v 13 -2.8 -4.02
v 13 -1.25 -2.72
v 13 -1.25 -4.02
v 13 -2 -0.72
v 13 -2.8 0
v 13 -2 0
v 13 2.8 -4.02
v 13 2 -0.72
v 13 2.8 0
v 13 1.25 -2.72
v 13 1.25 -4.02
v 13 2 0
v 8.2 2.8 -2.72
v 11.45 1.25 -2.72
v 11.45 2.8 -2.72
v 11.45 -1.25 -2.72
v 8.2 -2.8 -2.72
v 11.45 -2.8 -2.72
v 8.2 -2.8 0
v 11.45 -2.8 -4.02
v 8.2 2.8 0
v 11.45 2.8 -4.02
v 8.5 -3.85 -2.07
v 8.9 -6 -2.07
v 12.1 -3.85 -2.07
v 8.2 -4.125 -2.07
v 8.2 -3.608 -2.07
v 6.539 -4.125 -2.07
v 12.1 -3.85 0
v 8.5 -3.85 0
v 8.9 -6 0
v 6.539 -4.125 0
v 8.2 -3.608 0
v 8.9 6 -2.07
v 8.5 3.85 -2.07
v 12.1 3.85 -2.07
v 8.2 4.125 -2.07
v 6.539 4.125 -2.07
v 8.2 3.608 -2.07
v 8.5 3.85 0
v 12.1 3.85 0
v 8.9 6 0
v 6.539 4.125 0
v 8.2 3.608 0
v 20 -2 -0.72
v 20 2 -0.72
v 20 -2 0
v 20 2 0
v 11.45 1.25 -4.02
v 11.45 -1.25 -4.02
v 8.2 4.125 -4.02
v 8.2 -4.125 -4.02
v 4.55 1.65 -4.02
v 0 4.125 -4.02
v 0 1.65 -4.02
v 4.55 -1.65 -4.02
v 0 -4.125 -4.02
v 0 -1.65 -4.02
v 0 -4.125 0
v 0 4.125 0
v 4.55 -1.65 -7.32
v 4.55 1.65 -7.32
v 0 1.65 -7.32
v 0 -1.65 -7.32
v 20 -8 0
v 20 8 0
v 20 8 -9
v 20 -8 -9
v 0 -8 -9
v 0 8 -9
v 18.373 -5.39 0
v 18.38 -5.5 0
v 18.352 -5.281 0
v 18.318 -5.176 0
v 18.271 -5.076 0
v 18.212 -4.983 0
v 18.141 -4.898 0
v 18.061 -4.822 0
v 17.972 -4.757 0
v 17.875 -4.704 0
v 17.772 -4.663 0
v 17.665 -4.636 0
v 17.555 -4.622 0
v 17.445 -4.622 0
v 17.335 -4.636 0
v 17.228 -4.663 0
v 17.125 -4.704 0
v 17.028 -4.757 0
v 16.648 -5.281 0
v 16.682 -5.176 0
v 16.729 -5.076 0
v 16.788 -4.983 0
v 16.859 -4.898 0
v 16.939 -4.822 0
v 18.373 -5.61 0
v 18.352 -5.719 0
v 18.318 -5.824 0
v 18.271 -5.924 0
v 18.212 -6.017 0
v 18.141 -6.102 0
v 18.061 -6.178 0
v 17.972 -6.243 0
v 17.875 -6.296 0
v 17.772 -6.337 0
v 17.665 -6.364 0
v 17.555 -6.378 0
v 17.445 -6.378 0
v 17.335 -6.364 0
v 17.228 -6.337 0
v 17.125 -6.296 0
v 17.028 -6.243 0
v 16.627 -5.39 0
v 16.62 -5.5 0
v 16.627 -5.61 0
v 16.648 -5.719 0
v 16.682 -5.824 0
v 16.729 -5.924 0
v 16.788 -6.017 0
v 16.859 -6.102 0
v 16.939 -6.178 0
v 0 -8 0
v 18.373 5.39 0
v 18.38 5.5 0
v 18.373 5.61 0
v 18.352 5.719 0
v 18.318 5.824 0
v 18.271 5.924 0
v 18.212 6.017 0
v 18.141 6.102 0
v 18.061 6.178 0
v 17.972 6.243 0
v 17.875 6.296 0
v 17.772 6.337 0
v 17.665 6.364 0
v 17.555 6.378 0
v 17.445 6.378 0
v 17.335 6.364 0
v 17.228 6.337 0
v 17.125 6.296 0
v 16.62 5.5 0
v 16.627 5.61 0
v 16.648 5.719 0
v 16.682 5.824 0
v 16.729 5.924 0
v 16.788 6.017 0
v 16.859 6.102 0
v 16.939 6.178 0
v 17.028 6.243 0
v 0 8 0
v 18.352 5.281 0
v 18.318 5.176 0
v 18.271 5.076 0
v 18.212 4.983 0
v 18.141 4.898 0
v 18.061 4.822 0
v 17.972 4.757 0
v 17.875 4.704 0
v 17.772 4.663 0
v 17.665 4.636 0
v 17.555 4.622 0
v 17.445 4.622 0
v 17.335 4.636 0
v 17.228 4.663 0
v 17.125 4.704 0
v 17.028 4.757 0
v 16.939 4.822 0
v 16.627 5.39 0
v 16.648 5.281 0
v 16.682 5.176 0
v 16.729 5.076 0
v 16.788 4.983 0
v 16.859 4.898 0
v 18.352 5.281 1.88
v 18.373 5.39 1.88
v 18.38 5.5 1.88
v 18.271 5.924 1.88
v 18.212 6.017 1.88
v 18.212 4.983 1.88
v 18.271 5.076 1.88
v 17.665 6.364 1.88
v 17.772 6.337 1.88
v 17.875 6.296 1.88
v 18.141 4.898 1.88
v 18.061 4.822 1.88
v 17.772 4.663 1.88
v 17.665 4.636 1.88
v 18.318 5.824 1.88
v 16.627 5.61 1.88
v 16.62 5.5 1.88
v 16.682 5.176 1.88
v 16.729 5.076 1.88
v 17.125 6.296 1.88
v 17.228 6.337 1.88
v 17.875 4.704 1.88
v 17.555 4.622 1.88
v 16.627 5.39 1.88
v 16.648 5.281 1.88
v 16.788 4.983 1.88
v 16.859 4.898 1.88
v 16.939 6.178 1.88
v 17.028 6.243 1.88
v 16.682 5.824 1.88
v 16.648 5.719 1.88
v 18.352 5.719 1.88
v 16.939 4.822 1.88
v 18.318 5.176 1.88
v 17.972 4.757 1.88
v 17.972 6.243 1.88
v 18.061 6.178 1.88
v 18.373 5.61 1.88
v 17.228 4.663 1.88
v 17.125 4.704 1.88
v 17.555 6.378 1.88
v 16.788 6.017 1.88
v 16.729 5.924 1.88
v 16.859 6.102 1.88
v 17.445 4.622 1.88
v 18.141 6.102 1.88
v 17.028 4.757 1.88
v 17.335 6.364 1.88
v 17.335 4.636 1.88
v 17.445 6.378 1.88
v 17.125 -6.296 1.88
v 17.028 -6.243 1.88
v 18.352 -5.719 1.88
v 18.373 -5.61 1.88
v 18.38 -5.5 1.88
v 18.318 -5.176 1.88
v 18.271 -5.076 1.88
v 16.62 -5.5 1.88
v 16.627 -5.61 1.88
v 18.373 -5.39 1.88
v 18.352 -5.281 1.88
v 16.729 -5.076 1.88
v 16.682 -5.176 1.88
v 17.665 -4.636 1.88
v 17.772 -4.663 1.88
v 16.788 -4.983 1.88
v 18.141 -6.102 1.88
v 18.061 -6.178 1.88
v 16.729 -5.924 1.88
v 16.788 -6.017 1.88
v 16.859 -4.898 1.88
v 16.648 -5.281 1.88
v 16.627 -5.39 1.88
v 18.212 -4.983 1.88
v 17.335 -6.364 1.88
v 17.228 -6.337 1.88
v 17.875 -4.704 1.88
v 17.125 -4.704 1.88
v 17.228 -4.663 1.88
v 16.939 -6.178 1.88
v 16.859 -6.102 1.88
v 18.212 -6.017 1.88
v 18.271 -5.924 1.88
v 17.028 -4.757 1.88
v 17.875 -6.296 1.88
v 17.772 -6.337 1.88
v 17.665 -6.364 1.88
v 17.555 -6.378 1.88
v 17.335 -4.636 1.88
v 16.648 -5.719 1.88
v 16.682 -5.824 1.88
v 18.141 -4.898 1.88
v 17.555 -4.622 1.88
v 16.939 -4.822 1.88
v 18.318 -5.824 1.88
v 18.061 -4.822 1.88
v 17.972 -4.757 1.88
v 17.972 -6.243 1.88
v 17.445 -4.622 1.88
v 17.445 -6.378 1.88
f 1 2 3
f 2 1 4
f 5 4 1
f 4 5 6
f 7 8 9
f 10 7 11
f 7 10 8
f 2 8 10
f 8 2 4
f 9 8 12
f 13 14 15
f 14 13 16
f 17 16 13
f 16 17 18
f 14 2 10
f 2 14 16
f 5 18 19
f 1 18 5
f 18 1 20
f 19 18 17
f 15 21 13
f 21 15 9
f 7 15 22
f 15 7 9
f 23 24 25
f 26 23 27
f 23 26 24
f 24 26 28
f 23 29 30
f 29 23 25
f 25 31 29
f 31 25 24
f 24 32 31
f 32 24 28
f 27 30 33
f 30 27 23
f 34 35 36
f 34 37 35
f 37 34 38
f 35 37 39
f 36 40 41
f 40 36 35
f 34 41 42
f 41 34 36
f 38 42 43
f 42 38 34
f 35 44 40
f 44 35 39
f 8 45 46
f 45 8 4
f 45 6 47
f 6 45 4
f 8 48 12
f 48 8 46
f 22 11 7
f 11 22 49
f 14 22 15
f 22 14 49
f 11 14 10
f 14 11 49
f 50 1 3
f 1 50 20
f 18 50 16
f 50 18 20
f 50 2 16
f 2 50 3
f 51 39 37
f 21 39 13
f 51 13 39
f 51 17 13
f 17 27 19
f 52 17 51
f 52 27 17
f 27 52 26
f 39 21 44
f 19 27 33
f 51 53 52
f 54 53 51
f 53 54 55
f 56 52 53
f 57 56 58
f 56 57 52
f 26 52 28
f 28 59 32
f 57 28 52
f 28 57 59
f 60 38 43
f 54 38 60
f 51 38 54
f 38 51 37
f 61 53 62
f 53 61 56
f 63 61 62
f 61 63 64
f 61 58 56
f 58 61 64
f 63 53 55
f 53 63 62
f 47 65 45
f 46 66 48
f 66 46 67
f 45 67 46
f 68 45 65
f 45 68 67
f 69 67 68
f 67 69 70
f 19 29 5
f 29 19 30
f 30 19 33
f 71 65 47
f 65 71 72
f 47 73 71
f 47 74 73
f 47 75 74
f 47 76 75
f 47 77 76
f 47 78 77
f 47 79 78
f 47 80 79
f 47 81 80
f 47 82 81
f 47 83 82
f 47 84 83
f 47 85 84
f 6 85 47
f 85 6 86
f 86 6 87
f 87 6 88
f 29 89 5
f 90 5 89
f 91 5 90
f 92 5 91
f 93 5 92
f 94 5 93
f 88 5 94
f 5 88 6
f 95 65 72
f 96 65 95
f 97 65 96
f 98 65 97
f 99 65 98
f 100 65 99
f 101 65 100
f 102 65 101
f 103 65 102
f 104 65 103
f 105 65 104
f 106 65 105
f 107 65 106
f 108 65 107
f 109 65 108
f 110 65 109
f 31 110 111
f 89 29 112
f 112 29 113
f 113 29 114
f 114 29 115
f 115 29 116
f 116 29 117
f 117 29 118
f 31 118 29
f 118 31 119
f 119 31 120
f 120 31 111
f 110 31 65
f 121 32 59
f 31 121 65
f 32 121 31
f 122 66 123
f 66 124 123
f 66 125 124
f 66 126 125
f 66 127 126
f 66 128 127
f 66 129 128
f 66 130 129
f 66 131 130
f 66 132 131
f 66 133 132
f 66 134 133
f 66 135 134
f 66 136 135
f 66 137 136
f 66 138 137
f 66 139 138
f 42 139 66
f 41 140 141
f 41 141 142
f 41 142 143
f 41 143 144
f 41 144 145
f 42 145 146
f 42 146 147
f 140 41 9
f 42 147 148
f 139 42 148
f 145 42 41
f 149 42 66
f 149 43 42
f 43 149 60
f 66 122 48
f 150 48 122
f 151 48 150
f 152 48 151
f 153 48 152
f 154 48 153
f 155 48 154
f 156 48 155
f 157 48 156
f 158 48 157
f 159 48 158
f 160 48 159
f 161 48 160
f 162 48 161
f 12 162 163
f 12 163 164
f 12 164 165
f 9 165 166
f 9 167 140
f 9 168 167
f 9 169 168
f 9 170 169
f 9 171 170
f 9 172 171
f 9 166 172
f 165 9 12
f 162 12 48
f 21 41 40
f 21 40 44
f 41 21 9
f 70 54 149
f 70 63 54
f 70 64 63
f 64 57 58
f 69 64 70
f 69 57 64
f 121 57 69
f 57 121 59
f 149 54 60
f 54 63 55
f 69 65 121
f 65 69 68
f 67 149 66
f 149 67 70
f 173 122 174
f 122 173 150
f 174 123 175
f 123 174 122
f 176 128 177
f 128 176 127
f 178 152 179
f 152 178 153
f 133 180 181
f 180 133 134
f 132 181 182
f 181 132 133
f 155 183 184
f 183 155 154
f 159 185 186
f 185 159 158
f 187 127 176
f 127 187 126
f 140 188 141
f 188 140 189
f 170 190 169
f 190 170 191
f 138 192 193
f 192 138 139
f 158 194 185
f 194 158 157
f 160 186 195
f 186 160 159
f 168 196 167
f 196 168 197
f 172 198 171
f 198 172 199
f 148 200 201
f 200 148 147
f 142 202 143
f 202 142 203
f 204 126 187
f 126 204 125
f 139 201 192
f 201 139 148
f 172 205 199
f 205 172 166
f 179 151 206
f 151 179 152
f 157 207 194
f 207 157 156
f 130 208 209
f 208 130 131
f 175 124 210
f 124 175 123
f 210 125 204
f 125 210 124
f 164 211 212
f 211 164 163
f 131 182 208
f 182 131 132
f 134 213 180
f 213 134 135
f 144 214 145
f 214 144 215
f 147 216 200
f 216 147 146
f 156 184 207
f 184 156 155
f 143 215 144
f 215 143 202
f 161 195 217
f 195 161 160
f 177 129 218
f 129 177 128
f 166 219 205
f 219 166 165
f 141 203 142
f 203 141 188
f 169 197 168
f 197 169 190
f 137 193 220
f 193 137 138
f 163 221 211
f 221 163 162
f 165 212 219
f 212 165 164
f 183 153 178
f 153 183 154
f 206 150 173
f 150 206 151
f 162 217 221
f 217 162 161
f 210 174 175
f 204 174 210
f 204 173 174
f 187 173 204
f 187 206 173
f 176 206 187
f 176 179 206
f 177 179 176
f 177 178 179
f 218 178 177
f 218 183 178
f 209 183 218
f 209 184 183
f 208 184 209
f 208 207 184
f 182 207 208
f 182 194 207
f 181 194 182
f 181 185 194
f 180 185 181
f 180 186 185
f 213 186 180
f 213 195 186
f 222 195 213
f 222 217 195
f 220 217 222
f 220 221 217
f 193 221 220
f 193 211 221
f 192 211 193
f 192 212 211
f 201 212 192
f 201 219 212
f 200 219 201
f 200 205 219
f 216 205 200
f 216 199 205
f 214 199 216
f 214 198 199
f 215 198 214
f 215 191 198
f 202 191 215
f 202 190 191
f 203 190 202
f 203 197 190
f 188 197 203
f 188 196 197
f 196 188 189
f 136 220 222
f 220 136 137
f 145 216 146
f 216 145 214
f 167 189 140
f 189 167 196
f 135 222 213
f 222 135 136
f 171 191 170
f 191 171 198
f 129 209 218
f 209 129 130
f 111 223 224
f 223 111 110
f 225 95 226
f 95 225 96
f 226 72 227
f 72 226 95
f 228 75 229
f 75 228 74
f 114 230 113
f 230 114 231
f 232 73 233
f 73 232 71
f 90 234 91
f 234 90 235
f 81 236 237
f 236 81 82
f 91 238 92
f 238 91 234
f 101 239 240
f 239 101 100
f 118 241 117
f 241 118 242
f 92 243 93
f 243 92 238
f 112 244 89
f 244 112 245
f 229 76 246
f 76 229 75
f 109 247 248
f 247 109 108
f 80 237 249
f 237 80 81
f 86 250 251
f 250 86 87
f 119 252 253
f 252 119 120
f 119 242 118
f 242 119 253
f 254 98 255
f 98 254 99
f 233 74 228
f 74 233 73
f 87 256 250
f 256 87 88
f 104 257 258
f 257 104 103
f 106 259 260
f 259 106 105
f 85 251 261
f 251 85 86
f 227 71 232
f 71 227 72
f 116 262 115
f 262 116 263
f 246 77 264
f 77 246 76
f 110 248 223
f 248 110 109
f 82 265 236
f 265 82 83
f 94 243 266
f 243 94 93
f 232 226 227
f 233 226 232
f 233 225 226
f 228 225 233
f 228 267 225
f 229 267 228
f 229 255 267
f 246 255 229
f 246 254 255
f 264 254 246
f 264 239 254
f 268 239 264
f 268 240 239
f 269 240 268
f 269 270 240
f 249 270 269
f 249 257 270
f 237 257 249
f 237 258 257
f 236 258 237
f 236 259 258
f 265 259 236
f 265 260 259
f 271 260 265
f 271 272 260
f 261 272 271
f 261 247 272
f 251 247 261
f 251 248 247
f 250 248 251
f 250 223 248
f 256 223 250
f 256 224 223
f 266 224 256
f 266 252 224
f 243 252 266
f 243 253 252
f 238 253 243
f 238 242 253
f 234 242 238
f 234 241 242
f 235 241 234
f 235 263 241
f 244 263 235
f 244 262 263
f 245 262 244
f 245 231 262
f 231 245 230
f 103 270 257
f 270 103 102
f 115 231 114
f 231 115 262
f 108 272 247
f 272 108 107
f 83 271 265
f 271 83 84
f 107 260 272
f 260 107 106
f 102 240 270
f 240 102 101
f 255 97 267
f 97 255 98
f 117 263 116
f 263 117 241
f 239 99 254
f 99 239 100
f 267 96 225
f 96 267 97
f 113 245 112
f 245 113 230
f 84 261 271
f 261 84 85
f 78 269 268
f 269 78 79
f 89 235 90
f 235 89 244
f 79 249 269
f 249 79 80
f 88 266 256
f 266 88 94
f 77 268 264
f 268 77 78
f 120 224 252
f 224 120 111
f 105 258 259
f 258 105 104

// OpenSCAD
module arm() {
    polygon(points=[[0, 0.5], [3.4, 3.2], [6.6, 1.05], [3.0, 1.05], [1.7, 0]]);
}

module jst_sm_plug() {
    translate([0, -2.8, 0]) cube([12, 5.6, 5.1]);
    translate([4.5, 2.8, 0.55]) linear_extrude(3.9) arm();
    translate([4.5, -2.8, 0.55]) mirror([0, 1, 0]) linear_extrude(3.9) arm();
    translate([11.5, -2.0, 1.2]) cube([20.5, 4.0, 1.9]);
    //bottom flap
    translate([10.45, -2.8, -1.3]) cube([1.55, 5.6, 1.3 + 1]);
    //top left flap
    translate([10.45, -2.8, 5.1 - 1]) cube([1.55, 1.55, 1.3 + 1]);
    //top right flap
    translate([10.45, 2.8 - 1.55, 5.1 - 1]) cube([1.55, 1.55, 1.3 + 1]);
}

module jst_sm_socket() {
    translate([12 - 4.8 -20, -(8.25 / 2), -1.3]) cube([20, 8.25, 7.7]);
    translate([12 - 8.45 - 11.25, -(3.3 / 2), 7.7 - 1.3 - 1]) cube([11.25, 3.3, 3.3 + 1]);
}

module jst_sm_combination() {
    translate([1, 0, 0]) {
        jst_sm_plug();
        jst_sm_socket();
    }
}

carrier_width = 16;
carrier_length = 20;
carrier_split_height = 2.5;
carrier_split_margin = 0.12;
registration_hole_radius = 1;
registration_hole_offset = 1.5;
registration_hole_margin = 0.12;
registration_hole_depth = 2;

module registration_hole(positive) {
    radius = registration_hole_radius + (positive ? -registration_hole_margin : registration_hole_margin);
    cylinder(h=10, r1=radius, r2=radius, $fn=50);
}

module plug_carrier_underside() {
    difference() {
        bottom_offset = 3.0;
    
        translate([0, -(carrier_width / 2), 0]) cube([carrier_length, carrier_width, carrier_split_height + carrier_split_margin + bottom_offset]);
        translate([0, 0, bottom_offset]) jst_sm_combination();
    
        //registration holes
        translate([carrier_length - registration_hole_radius - registration_hole_offset, -(carrier_width / 2) + registration_hole_radius + registration_hole_offset, bottom_offset + carrier_split_height - registration_hole_depth]) registration_hole(false);

        translate([carrier_length - registration_hole_radius - registration_hole_offset, (carrier_width / 2) - registration_hole_radius - registration_hole_offset, bottom_offset + carrier_split_height - registration_hole_depth]) registration_hole(false);
    }
}

module plug_carrier_upperside() {
    rotate([180, 0, 0]) {
        difference() {
    
            translate([0, -(carrier_width / 2), 0]) cube([carrier_length, carrier_width, 9]);
            translate([0, 0, -carrier_split_height + carrier_split_margin])    jst_sm_combination();
        }
        //registration holes
        translate([carrier_length - registration_hole_radius - registration_hole_offset, -(carrier_width / 2) + registration_hole_radius + registration_hole_offset, -registration_hole_depth + registration_hole_margin]) registration_hole(true);

        translate([carrier_length - registration_hole_radius - registration_hole_offset, (carrier_width / 2) - registration_hole_radius - registration_hole_offset, -registration_hole_depth + registration_hole_margin]) registration_hole(true);
    }
}

plug_carrier_upperside();
